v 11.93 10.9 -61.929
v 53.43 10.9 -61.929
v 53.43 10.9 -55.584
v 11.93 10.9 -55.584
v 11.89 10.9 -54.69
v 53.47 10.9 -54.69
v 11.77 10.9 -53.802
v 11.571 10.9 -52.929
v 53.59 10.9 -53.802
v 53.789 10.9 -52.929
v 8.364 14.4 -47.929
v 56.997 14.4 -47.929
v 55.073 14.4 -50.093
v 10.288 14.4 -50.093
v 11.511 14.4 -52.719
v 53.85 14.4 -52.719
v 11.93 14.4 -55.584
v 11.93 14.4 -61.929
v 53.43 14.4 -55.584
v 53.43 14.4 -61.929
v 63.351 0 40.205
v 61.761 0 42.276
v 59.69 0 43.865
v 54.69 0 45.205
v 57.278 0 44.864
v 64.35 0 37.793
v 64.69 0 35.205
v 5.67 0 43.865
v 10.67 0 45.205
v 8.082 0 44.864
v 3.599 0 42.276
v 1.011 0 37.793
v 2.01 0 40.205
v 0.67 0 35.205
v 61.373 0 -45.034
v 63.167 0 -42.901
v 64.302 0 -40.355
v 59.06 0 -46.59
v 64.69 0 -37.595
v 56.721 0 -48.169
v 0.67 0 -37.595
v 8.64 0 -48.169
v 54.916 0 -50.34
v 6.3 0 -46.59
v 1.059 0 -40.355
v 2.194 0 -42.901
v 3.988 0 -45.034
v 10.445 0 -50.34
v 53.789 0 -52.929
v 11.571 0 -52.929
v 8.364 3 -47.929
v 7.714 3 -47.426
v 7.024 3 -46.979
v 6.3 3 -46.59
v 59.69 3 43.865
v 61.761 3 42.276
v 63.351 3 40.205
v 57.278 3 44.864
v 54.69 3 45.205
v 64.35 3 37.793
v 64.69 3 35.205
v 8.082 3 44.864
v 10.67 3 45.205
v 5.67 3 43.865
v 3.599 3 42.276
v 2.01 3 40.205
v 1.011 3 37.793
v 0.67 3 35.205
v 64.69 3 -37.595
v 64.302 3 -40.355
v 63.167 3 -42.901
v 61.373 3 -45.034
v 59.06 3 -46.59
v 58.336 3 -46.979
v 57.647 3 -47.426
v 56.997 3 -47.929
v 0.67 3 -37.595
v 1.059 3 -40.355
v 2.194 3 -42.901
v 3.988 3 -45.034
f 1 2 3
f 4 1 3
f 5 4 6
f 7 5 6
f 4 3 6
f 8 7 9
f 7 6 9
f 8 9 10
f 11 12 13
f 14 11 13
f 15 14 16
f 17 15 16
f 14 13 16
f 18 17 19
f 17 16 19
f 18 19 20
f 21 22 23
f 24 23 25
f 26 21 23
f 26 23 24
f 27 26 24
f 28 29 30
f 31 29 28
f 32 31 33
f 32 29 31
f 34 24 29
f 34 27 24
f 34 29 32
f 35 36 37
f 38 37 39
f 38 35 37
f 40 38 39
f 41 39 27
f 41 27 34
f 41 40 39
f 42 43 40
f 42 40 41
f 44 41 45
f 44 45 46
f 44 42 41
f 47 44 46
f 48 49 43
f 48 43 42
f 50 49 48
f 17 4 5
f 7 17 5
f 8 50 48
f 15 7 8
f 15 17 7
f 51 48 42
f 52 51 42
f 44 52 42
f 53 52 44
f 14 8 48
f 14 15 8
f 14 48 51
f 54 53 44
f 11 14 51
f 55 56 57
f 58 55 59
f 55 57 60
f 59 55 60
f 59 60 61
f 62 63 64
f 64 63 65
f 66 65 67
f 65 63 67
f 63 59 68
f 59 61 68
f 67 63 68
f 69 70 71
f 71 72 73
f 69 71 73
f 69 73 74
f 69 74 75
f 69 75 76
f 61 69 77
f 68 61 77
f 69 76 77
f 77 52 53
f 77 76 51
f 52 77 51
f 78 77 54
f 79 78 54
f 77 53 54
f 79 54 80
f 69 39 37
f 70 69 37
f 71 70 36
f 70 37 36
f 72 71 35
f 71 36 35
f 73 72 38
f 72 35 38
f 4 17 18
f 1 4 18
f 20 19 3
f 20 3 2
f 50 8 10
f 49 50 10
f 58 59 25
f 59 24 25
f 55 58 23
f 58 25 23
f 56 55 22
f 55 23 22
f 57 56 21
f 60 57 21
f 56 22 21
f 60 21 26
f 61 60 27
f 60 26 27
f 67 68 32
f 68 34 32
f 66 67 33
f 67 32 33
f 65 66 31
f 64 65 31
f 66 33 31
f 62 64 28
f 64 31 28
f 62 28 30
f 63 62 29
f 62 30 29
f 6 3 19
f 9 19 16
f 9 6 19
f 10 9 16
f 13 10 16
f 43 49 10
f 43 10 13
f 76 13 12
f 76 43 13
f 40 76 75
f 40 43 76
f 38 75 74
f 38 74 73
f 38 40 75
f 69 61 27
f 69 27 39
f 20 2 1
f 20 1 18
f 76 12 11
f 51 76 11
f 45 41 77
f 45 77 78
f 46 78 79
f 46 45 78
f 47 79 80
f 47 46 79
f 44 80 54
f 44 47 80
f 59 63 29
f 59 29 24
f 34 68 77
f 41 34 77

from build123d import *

# Parameters (mm, degrees)
SKETCH1_W           = 41.5
SKETCH1_H           = 92.8
BOSS_EXTRUDE1_DEPTH = 3
SKETCH2_W           = 5
SKETCH2_H           = 3.5
SKETCH2_H_2         = 7.9
SKETCH2_W_2         = 9
BOSS_EXTRUDE2_DEPTH = 41.5
SKETCH3_W           = 64.02
SKETCH3_H           = 92.8
BOSS_EXTRUDE3_DEPTH = 3
FILLET1_R           = 10
FILLET2_R           = 10


with BuildPart() as part:
    # Sketch1 → Boss-Extrude1 (new body)
    with BuildSketch(Plane(origin=(0, 0, 0), x_dir=(1, 0, 0), z_dir=(0, 1, 0))):
        with Locations((32.680302971, 6.528754522)):
            Rectangle(SKETCH1_W, SKETCH1_H)
    extrude(amount=BOSS_EXTRUDE1_DEPTH)

    # Sketch2 → Boss-Extrude2 (add)
    with BuildSketch(Plane(origin=(53.430302971, 0, 0), x_dir=(0, 0, -1), z_dir=(1, 0, 0))):
        with Locations((50.428754522, 12.65)):
            Rectangle(SKETCH2_W, SKETCH2_H)
        with Locations((50.428754522, 6.95)):
            Rectangle(SKETCH2_W, SKETCH2_H_2)
        with Locations((57.428754522, 12.65)):
            Rectangle(SKETCH2_W_2, SKETCH2_H)
    extrude(amount=-BOSS_EXTRUDE2_DEPTH)

    # Sketch3 → Boss-Extrude3 (add)
    with BuildSketch(Plane(origin=(0, 3, 0), x_dir=(1, 0, 0), z_dir=(0, 1, 0))):
        with Locations((32.680302971, 1.195086087)):
            Rectangle(SKETCH3_W, SKETCH3_H)
    extrude(amount=-BOSS_EXTRUDE3_DEPTH)

    # Fillet1
    fillet1_edges = [part.edges().sort_by_distance(p)[0] for p in [
        (0.670302971, 1.5, -47.595086087),
        (64.690302971, 1.5, -47.595086087),
        (64.690302971, 1.5, 45.204913913),
        (0.670302971, 1.5, 45.204913913),
    ]]
    fillet(fillet1_edges, radius=FILLET1_R)

    # Fillet2
    # the kernel refuses this fillet: 10 mm, written as the material it adds along each edge
    with BuildSketch(Plane(origin=(11.930302971, 22.973075278, -47.595086087), x_dir=(0, 0, -1), z_dir=(0, -1, 0))) as fillet2_piece_1_section:
        with BuildLine():
            CenterArc((7.989230111, -10), FILLET2_R, 90, 64.087374577)
            Line((-1.005384944, -5.63), (-1.90484645, -5.193))
            ThreePointArc((-1.90484645, -5.193), (-1, -1.26), (-1, 0))
            Line((-1, 0), (0, 1))
            Line((0, 1), (7.989230111, 1))
            Line((7.989230111, 1), (7.989230111, 0))
        make_face()
    fillet2_piece_1 = extrude(amount=22.973075278, mode=Mode.PRIVATE)
    fillet2_piece_1 = split(fillet2_piece_1, bisect_by=Plane(origin=(12.365804392, 12.65, -52.928754522), z_dir=(0, 0, -1)), keep=Keep.TOP, mode=Mode.PRIVATE)
    fillet2_piece_1 = split(fillet2_piece_1, bisect_by=Plane(origin=(12.365804392, 10.9, -54.185779558), z_dir=(0, 1, 0)), keep=Keep.TOP, mode=Mode.PRIVATE)
    fillet2_piece_1 = split(fillet2_piece_1, bisect_by=Plane(origin=(12.365804392, 14.4, -54.185779558), z_dir=(0, -1, 0)), keep=Keep.TOP, mode=Mode.PRIVATE)
    add(fillet2_piece_1)
    with BuildSketch(Plane(origin=(11.930302971, 22.973075278, -47.595086087), x_dir=(0, 0, -1), z_dir=(0, -1, 0))) as fillet2_piece_2_section:
        with BuildLine():
            CenterArc((7.989230111, -10), FILLET2_R, 90, 64.087374577)
            Line((-1.005384944, -5.63), (-1.90484645, -5.193))
            ThreePointArc((-1.90484645, -5.193), (-1, -1.26), (-1, 0))
            Line((-1, 0), (0, 1))
            Line((0, 1), (7.989230111, 1))
            Line((7.989230111, 1), (7.989230111, 0))
        make_face()
    fillet2_piece_2 = extrude(amount=22.973075278, mode=Mode.PRIVATE)
    fillet2_piece_2 = split(fillet2_piece_2, bisect_by=Plane(origin=(11.467639637, 12.65, -52.928754522), z_dir=(0, 0, 1)), keep=Keep.TOP, mode=Mode.PRIVATE)
    fillet2_piece_2 = split(fillet2_piece_2, bisect_by=Plane(origin=(11.467639637, 10.9, -49.92895082), z_dir=(0, 1, 0)), keep=Keep.TOP, mode=Mode.PRIVATE)
    fillet2_piece_2 = split(fillet2_piece_2, bisect_by=Plane(origin=(11.467639637, 14.4, -49.92895082), z_dir=(0, -1, 0)), keep=Keep.TOP, mode=Mode.PRIVATE)
    fillet2_piece_2 = split(fillet2_piece_2, bisect_by=Plane(origin=(11.467639637, 12.65, -47.928754522), z_dir=(0, 0, -1)), keep=Keep.TOP, mode=Mode.PRIVATE)
    add(fillet2_piece_2)
    with BuildSketch(Plane(origin=(11.930302971, 22.973075278, -47.595086087), x_dir=(0, 0, -1), z_dir=(0, -1, 0))) as fillet2_piece_3_section:
        with BuildLine():
            CenterArc((7.989230111, -10), FILLET2_R, 90, 64.087374577)
            Line((-1.005384944, -5.63), (-1.90484645, -5.193))
            ThreePointArc((-1.90484645, -5.193), (-1, -1.26), (-1, 0))
            Line((-1, 0), (0, 1))
            Line((0, 1), (7.989230111, 1))
            Line((7.989230111, 1), (7.989230111, 0))
        make_face()
    fillet2_piece_3 = extrude(amount=22.973075278, mode=Mode.PRIVATE)
    fillet2_piece_3 = split(fillet2_piece_3, bisect_by=Plane(origin=(11.467639637, 6.95, -52.928754522), z_dir=(0, 0, 1)), keep=Keep.TOP, mode=Mode.PRIVATE)
    fillet2_piece_3 = split(fillet2_piece_3, bisect_by=Plane(origin=(11.467639637, 10.9, -49.92895082), z_dir=(0, -1, 0)), keep=Keep.TOP, mode=Mode.PRIVATE)
    fillet2_piece_3 = split(fillet2_piece_3, bisect_by=Plane(origin=(11.467639637, 6.95, -47.928754522), z_dir=(0, 0, -1)), keep=Keep.TOP, mode=Mode.PRIVATE)
    fillet2_piece_3 = split(fillet2_piece_3, bisect_by=Plane(origin=(11.467639637, 3, -49.92895082), z_dir=(0, 1, 0)), keep=Keep.TOP, mode=Mode.PRIVATE)
    add(fillet2_piece_3)
    with BuildSketch(Plane(origin=(11.930302971, 3, -47.595086087), x_dir=(0, 0, -1), z_dir=(0, -1, 0))) as fillet2_piece_4_section:
        with BuildLine():
            CenterArc((7.989230111, -10), FILLET2_R, 90, 64.087374577)
            Line((-1.005384944, -5.63), (-1.90484645, -5.193))
            ThreePointArc((-1.90484645, -5.193), (-1, -1.26), (-1, 0))
            Line((-1, 0), (0, 1))
            Line((0, 1), (7.989230111, 1))
            Line((7.989230111, 1), (7.989230111, 0))
        make_face()
    fillet2_piece_4 = extrude(amount=3, mode=Mode.PRIVATE)
    fillet2_piece_4 = split(fillet2_piece_4, bisect_by=Plane(origin=(11.467639637, 1.5, -52.928754522), z_dir=(0, 0, 1)), keep=Keep.TOP, mode=Mode.PRIVATE)
    fillet2_piece_4 = split(fillet2_piece_4, bisect_by=Plane(origin=(11.467639637, 1.5, -47.928754522), z_dir=(0, 0, -1)), keep=Keep.TOP, mode=Mode.PRIVATE)
    add(fillet2_piece_4)
    with BuildSketch(Plane(origin=(11.930302971, 3, -47.595086087), x_dir=(0, 0, -1), z_dir=(0, -1, 0))) as fillet2_piece_5_section:
        with BuildLine():
            CenterArc((7.989230111, -10), FILLET2_R, 90, 64.087374577)
            Line((-1.005384944, -5.63), (-1.90484645, -5.193))
            ThreePointArc((-1.90484645, -5.193), (-1, -1.26), (-1, 0))
            Line((-1, 0), (0, 1))
            Line((0, 1), (7.989230111, 1))
            Line((7.989230111, 1), (7.989230111, 0))
        make_face()
    fillet2_piece_5 = extrude(amount=3, mode=Mode.PRIVATE)
    fillet2_piece_5 = split(fillet2_piece_5, bisect_by=Plane(origin=(9.548517713, 1.5, -47.928754522), z_dir=(0, 0, 1)), keep=Keep.TOP, mode=Mode.PRIVATE)
    add(fillet2_piece_5)
    with BuildSketch(Plane(origin=(53.430302971, 0, -47.595086087), x_dir=(0.9844267342530738, 0, 0.17579534944880632), z_dir=(0, 1, 0))) as fillet2_piece_6_section:
        with BuildLine():
            CenterArc((8.439797843, 9.622765202), FILLET2_R, 190.124945844, 64.087374577)
            Line((-1.404469499, 7.864811708), (-2.388896234, 7.689016358))
            Line((-2.388896234, 7.689016358), (-0.984426734, -0.175795349))
            Line((-0.984426734, -0.175795349), (0.175795349, -0.984426734))
            ThreePointArc((0.175795349, -0.984426734), (1.416173035, -0.762924594), (5.446991178, -0.96227652))
            Line((5.446991178, -0.96227652), (5.719064511, 0))
        make_face()
    fillet2_piece_6 = extrude(amount=3, mode=Mode.PRIVATE)
    fillet2_piece_6 = split(fillet2_piece_6, bisect_by=Plane(origin=(55.812088229, 1.5, -47.928754522), z_dir=(0, 0, 1)), keep=Keep.TOP, mode=Mode.PRIVATE)
    add(fillet2_piece_6)
    with BuildSketch(Plane(origin=(53.430302971, 0, -47.595086087), x_dir=(0.9844267342530738, 0, 0.17579534944880632), z_dir=(0, 1, 0))) as fillet2_piece_7_section:
        with BuildLine():
            CenterArc((8.439797843, 9.622765202), FILLET2_R, 190.124945844, 64.087374577)
            Line((-1.404469499, 7.864811708), (-2.388896234, 7.689016358))
            Line((-2.388896234, 7.689016358), (-0.984426734, -0.175795349))
            Line((-0.984426734, -0.175795349), (0.175795349, -0.984426734))
            ThreePointArc((0.175795349, -0.984426734), (1.416173035, -0.762924594), (5.446991178, -0.96227652))
            Line((5.446991178, -0.96227652), (5.719064511, 0))
        make_face()
    fillet2_piece_7 = extrude(amount=3, mode=Mode.PRIVATE)
    fillet2_piece_7 = split(fillet2_piece_7, bisect_by=Plane(origin=(53.892966305, 1.5, -52.928754522), z_dir=(0, 0, 1)), keep=Keep.TOP, mode=Mode.PRIVATE)
    fillet2_piece_7 = split(fillet2_piece_7, bisect_by=Plane(origin=(53.892966305, 1.5, -47.928754522), z_dir=(0, 0, -1)), keep=Keep.TOP, mode=Mode.PRIVATE)
    add(fillet2_piece_7)
    with BuildSketch(Plane(origin=(53.430302971, 0, -47.595086087), x_dir=(0.9844267342530738, 0, 0.17579534944880632), z_dir=(0, 1, 0))) as fillet2_piece_8_section:
        with BuildLine():
            CenterArc((8.439797843, 9.622765202), FILLET2_R, 190.124945844, 64.087374577)
            Line((-1.404469499, 7.864811708), (-2.388896234, 7.689016358))
            Line((-2.388896234, 7.689016358), (-0.984426734, -0.175795349))
            Line((-0.984426734, -0.175795349), (0.175795349, -0.984426734))
            ThreePointArc((0.175795349, -0.984426734), (1.416173035, -0.762924594), (5.446991178, -0.96227652))
            Line((5.446991178, -0.96227652), (5.719064511, 0))
        make_face()
    fillet2_piece_8 = extrude(amount=22.973075278, mode=Mode.PRIVATE)
    fillet2_piece_8 = split(fillet2_piece_8, bisect_by=Plane(origin=(53.892966305, 3, -49.92895082), z_dir=(0, 1, 0)), keep=Keep.TOP, mode=Mode.PRIVATE)
    fillet2_piece_8 = split(fillet2_piece_8, bisect_by=Plane(origin=(53.892966305, 6.95, -52.928754522), z_dir=(0, 0, 1)), keep=Keep.TOP, mode=Mode.PRIVATE)
    fillet2_piece_8 = split(fillet2_piece_8, bisect_by=Plane(origin=(53.892966305, 6.95, -47.928754522), z_dir=(0, 0, -1)), keep=Keep.TOP, mode=Mode.PRIVATE)
    fillet2_piece_8 = split(fillet2_piece_8, bisect_by=Plane(origin=(53.892966305, 10.9, -49.92895082), z_dir=(0, -1, 0)), keep=Keep.TOP, mode=Mode.PRIVATE)
    add(fillet2_piece_8)
    with BuildSketch(Plane(origin=(53.430302971, 0, -47.595086087), x_dir=(0.9844267342530738, 0, 0.17579534944880632), z_dir=(0, 1, 0))) as fillet2_piece_9_section:
        with BuildLine():
            CenterArc((8.439797843, 9.622765202), FILLET2_R, 190.124945844, 64.087374577)
            Line((-1.404469499, 7.864811708), (-2.388896234, 7.689016358))
            Line((-2.388896234, 7.689016358), (-0.984426734, -0.175795349))
            Line((-0.984426734, -0.175795349), (0.175795349, -0.984426734))
            ThreePointArc((0.175795349, -0.984426734), (1.416173035, -0.762924594), (5.446991178, -0.96227652))
            Line((5.446991178, -0.96227652), (5.719064511, 0))
        make_face()
    fillet2_piece_9 = extrude(amount=22.973075278, mode=Mode.PRIVATE)
    fillet2_piece_9 = split(fillet2_piece_9, bisect_by=Plane(origin=(53.892966305, 12.65, -52.928754522), z_dir=(0, 0, 1)), keep=Keep.TOP, mode=Mode.PRIVATE)
    fillet2_piece_9 = split(fillet2_piece_9, bisect_by=Plane(origin=(53.892966305, 12.65, -47.928754522), z_dir=(0, 0, -1)), keep=Keep.TOP, mode=Mode.PRIVATE)
    fillet2_piece_9 = split(fillet2_piece_9, bisect_by=Plane(origin=(53.892966305, 14.4, -49.92895082), z_dir=(0, -1, 0)), keep=Keep.TOP, mode=Mode.PRIVATE)
    fillet2_piece_9 = split(fillet2_piece_9, bisect_by=Plane(origin=(53.892966305, 10.9, -49.92895082), z_dir=(0, 1, 0)), keep=Keep.TOP, mode=Mode.PRIVATE)
    add(fillet2_piece_9)
    with BuildSketch(Plane(origin=(53.430302971, 0, -47.595086087), x_dir=(0.9844267342530738, 0, 0.17579534944880632), z_dir=(0, 1, 0))) as fillet2_piece_10_section:
        with BuildLine():
            CenterArc((8.439797843, 9.622765202), FILLET2_R, 190.124945844, 64.087374577)
            Line((-1.404469499, 7.864811708), (-2.388896234, 7.689016358))
            Line((-2.388896234, 7.689016358), (-0.984426734, -0.175795349))
            Line((-0.984426734, -0.175795349), (0.175795349, -0.984426734))
            ThreePointArc((0.175795349, -0.984426734), (1.416173035, -0.762924594), (5.446991178, -0.96227652))
            Line((5.446991178, -0.96227652), (5.719064511, 0))
        make_face()
    fillet2_piece_10 = extrude(amount=22.973075278, mode=Mode.PRIVATE)
    fillet2_piece_10 = split(fillet2_piece_10, bisect_by=Plane(origin=(52.99480155, 12.65, -52.928754522), z_dir=(0, 0, -1)), keep=Keep.TOP, mode=Mode.PRIVATE)
    fillet2_piece_10 = split(fillet2_piece_10, bisect_by=Plane(origin=(52.99480155, 14.4, -54.185779558), z_dir=(0, -1, 0)), keep=Keep.TOP, mode=Mode.PRIVATE)
    fillet2_piece_10 = split(fillet2_piece_10, bisect_by=Plane(origin=(52.99480155, 10.9, -54.185779558), z_dir=(0, 1, 0)), keep=Keep.TOP, mode=Mode.PRIVATE)
    add(fillet2_piece_10)


solid = part.part
